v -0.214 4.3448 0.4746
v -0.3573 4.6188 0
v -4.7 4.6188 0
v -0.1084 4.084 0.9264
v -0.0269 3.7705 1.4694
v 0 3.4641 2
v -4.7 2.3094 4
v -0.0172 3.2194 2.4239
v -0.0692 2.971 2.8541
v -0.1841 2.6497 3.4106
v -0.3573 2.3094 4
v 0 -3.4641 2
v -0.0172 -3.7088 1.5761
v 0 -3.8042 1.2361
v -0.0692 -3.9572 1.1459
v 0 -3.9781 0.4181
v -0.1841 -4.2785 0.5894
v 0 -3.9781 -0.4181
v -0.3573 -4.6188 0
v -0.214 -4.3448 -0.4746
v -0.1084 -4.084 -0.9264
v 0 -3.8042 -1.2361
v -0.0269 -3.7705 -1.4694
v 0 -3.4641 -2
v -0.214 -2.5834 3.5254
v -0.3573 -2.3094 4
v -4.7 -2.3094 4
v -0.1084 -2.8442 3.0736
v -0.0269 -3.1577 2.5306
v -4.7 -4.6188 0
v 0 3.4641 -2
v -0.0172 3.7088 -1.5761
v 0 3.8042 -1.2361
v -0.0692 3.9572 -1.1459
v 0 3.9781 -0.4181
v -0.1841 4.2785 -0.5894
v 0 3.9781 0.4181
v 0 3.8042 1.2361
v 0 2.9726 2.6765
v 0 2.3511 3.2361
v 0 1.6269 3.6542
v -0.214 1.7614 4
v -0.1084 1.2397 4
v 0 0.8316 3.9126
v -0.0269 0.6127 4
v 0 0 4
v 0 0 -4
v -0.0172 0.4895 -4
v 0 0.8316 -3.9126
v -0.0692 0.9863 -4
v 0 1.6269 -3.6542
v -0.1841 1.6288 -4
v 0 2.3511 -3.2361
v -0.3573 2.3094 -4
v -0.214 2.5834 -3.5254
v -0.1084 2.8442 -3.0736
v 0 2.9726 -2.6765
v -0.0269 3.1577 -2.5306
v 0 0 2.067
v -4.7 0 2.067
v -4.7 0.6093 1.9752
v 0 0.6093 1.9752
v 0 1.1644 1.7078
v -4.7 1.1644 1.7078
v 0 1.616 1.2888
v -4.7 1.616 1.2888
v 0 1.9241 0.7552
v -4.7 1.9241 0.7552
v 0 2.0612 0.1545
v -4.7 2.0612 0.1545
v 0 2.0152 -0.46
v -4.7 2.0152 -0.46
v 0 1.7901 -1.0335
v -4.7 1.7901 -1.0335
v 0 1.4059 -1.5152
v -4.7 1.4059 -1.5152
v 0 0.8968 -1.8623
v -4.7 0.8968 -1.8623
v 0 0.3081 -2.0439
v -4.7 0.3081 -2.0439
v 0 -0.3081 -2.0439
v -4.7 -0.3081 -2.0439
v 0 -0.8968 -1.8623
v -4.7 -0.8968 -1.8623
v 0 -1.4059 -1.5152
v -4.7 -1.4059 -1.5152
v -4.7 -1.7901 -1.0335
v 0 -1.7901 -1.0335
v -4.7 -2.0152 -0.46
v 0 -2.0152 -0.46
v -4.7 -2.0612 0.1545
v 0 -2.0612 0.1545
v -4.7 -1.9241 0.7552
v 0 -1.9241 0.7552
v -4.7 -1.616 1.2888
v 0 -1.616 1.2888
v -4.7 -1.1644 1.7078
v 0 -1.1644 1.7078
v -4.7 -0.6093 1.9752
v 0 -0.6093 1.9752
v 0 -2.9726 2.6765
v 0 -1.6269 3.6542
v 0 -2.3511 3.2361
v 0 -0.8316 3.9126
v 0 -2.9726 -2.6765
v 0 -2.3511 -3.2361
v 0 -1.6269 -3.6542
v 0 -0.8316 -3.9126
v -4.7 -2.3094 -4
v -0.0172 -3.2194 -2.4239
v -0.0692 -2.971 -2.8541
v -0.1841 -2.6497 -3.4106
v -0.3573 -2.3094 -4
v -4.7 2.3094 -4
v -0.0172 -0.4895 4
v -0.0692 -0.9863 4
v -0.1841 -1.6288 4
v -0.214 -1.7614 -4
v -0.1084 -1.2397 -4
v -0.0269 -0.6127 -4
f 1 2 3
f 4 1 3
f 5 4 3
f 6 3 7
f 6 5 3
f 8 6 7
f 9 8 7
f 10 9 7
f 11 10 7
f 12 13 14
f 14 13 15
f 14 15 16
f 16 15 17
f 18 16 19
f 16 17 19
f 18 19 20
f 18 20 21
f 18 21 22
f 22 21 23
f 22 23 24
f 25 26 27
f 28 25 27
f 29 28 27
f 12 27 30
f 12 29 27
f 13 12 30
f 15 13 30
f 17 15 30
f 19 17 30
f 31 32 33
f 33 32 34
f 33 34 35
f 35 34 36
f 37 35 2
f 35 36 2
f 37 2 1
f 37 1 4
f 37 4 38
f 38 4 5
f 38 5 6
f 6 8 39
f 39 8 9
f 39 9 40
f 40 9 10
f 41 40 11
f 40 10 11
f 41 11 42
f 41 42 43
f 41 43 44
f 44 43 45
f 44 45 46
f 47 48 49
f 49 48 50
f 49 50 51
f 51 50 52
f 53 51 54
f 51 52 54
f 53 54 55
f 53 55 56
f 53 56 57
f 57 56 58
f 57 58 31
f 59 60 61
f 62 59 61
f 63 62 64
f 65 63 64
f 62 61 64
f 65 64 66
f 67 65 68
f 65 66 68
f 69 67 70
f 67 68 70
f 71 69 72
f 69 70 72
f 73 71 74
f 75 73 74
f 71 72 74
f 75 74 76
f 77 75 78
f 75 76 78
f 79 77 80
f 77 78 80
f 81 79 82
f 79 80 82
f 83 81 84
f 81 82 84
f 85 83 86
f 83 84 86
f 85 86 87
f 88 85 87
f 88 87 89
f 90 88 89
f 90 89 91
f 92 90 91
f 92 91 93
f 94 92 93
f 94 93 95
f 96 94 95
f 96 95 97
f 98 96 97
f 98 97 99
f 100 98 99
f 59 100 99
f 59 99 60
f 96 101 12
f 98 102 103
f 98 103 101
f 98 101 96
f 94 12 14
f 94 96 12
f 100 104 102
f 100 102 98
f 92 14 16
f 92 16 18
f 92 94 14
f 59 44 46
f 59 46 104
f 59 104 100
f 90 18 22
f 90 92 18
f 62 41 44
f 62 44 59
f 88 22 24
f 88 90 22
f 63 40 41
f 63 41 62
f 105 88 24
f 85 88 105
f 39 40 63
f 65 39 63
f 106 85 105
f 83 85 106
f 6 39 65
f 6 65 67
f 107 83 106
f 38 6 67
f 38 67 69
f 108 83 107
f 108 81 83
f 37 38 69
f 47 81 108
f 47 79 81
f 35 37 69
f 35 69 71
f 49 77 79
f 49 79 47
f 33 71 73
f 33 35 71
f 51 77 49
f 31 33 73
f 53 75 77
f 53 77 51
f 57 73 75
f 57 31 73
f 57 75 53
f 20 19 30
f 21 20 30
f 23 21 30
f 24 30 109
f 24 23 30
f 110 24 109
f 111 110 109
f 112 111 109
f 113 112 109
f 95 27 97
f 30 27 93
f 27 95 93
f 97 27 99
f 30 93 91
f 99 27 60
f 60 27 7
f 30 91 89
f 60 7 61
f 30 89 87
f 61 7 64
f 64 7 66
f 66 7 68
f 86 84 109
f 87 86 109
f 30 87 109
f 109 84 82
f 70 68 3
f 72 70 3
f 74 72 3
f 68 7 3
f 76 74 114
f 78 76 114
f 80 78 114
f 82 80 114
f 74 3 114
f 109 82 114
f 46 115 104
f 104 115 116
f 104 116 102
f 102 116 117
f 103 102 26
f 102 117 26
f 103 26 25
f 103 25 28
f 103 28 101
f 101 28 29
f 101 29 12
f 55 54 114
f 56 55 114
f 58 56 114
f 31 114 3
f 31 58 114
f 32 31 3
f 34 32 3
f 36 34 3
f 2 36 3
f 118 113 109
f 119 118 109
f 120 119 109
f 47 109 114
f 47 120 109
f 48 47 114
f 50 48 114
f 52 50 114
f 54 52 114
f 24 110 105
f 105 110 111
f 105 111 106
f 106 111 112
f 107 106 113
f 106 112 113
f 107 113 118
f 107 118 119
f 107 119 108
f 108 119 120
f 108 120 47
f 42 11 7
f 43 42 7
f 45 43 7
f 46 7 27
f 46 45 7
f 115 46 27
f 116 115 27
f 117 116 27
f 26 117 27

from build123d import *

# Parameters (mm, degrees)
BOSS_EXTRUDE1_DEPTH = 4.7
TAP1_D              = 4.134


with BuildPart() as part:
    # Sketch1 → Boss-Extrude1 (new body)
    with BuildSketch(Plane(origin=(0, 0, 0), x_dir=(0, 0, -1), z_dir=(1, 0, 0))):
        Polygon((0, 4.618802154), (-4, 2.309401077), (-4, -2.309401077), (0, -4.618802154), (4, -2.309401077), (4, 2.309401077), align=None)
    extrude(amount=-BOSS_EXTRUDE1_DEPTH)

    # Sketch2 → Cut-Revolve1 (revolve, cut)
    with BuildSketch(Plane.XY):
        Polygon((0, 4), (-0.35726559, 4.618802154), (0, 4.618802154), align=None)
    revolve(axis=Axis((-0.35726559, 0, 0), (1, 0, 0)), mode=Mode.SUBTRACT)

    # Tap1 (through all)
    with Locations(Plane(origin=(0, 0, 0), x_dir=(0, 0, -1), z_dir=(1, 0, 0))):
        with Locations((0, 0)):
            Hole(TAP1_D / 2)


solid = part.part
